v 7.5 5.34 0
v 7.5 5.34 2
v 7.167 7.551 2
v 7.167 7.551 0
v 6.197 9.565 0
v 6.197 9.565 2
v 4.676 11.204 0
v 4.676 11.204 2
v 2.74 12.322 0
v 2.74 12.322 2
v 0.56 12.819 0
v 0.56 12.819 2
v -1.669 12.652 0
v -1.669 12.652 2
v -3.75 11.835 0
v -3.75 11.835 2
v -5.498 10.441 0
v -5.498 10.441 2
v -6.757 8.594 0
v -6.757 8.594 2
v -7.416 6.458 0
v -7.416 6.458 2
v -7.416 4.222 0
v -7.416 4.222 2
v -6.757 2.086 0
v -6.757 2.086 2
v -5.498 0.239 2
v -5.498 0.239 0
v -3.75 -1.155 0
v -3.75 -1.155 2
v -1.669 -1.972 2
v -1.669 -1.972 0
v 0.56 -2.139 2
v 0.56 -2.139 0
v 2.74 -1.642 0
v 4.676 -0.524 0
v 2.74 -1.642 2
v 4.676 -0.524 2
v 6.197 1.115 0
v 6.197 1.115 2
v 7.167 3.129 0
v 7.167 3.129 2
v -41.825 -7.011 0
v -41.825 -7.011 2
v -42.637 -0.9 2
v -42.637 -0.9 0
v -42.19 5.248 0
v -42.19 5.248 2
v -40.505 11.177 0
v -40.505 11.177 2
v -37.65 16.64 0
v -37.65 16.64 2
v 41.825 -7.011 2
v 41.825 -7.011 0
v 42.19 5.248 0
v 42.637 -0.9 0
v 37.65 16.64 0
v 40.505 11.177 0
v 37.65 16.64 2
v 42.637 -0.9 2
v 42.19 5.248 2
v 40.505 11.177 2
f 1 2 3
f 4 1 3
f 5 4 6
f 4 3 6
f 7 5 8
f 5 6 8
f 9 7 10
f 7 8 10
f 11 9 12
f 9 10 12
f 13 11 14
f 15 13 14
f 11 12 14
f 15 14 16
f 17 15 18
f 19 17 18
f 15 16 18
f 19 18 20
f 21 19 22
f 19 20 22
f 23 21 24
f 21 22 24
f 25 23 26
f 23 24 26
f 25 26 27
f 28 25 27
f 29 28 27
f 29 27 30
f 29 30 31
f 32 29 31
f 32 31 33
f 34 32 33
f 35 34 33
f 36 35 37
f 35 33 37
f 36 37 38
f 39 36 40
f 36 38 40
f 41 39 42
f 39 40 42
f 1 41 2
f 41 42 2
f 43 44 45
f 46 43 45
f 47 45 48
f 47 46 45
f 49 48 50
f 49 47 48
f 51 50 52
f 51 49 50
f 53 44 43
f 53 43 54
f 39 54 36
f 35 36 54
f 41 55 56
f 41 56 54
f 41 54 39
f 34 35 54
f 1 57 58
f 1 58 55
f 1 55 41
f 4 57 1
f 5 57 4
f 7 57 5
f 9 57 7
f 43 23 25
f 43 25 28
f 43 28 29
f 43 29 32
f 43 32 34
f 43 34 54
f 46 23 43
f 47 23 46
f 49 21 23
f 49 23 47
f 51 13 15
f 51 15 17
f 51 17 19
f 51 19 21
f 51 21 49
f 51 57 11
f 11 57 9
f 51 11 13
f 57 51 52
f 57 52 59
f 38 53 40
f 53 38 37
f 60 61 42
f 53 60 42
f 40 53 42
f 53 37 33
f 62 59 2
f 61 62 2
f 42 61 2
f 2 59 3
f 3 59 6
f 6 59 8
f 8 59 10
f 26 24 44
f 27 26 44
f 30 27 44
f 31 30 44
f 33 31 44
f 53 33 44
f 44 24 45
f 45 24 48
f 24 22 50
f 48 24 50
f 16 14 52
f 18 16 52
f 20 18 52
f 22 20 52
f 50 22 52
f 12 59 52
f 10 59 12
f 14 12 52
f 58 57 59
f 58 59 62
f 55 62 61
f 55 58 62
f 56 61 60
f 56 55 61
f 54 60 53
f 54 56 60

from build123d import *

# Parameters (mm, degrees)
BOSS_EXTRUDE1_DEPTH = 2
SKETCH6_R           = 7.5
CUT_EXTRUDE1_DEPTH  = 2
SKETCH7_W           = 96.175516813
SKETCH7_H           = 15.621463592
CUT_EXTRUDE2_DEPTH  = 2


with BuildPart() as part:
    # Sketch5 → Boss-Extrude1 (new body)
    with BuildSketch(Plane.XY):
        with BuildLine():
            Line((-37.65, 16.64), (37.65, 16.64))
            ThreePointArc((37.65, 16.64), (42.65, 0), (37.65, -16.64))
            Line((37.65, -16.64), (-37.65, -16.64))
            ThreePointArc((-37.65, -16.64), (-42.65, 0), (-37.65, 16.64))
        make_face()
    extrude(amount=BOSS_EXTRUDE1_DEPTH)

    # Sketch6 → Cut-Extrude1 (cut)
    with BuildSketch(Plane.XY.offset(2)):
        with Locations((0, 5.34)):
            Circle(SKETCH6_R)
    extrude(amount=-CUT_EXTRUDE1_DEPTH, mode=Mode.SUBTRACT)

    # Sketch7 → Cut-Extrude2 (cut)
    with BuildSketch(Plane.XY.offset(2)):
        with Locations((0.470526011, -14.821569372)):
            Rectangle(SKETCH7_W, SKETCH7_H)
    extrude(amount=-CUT_EXTRUDE2_DEPTH, mode=Mode.SUBTRACT)


solid = part.part
